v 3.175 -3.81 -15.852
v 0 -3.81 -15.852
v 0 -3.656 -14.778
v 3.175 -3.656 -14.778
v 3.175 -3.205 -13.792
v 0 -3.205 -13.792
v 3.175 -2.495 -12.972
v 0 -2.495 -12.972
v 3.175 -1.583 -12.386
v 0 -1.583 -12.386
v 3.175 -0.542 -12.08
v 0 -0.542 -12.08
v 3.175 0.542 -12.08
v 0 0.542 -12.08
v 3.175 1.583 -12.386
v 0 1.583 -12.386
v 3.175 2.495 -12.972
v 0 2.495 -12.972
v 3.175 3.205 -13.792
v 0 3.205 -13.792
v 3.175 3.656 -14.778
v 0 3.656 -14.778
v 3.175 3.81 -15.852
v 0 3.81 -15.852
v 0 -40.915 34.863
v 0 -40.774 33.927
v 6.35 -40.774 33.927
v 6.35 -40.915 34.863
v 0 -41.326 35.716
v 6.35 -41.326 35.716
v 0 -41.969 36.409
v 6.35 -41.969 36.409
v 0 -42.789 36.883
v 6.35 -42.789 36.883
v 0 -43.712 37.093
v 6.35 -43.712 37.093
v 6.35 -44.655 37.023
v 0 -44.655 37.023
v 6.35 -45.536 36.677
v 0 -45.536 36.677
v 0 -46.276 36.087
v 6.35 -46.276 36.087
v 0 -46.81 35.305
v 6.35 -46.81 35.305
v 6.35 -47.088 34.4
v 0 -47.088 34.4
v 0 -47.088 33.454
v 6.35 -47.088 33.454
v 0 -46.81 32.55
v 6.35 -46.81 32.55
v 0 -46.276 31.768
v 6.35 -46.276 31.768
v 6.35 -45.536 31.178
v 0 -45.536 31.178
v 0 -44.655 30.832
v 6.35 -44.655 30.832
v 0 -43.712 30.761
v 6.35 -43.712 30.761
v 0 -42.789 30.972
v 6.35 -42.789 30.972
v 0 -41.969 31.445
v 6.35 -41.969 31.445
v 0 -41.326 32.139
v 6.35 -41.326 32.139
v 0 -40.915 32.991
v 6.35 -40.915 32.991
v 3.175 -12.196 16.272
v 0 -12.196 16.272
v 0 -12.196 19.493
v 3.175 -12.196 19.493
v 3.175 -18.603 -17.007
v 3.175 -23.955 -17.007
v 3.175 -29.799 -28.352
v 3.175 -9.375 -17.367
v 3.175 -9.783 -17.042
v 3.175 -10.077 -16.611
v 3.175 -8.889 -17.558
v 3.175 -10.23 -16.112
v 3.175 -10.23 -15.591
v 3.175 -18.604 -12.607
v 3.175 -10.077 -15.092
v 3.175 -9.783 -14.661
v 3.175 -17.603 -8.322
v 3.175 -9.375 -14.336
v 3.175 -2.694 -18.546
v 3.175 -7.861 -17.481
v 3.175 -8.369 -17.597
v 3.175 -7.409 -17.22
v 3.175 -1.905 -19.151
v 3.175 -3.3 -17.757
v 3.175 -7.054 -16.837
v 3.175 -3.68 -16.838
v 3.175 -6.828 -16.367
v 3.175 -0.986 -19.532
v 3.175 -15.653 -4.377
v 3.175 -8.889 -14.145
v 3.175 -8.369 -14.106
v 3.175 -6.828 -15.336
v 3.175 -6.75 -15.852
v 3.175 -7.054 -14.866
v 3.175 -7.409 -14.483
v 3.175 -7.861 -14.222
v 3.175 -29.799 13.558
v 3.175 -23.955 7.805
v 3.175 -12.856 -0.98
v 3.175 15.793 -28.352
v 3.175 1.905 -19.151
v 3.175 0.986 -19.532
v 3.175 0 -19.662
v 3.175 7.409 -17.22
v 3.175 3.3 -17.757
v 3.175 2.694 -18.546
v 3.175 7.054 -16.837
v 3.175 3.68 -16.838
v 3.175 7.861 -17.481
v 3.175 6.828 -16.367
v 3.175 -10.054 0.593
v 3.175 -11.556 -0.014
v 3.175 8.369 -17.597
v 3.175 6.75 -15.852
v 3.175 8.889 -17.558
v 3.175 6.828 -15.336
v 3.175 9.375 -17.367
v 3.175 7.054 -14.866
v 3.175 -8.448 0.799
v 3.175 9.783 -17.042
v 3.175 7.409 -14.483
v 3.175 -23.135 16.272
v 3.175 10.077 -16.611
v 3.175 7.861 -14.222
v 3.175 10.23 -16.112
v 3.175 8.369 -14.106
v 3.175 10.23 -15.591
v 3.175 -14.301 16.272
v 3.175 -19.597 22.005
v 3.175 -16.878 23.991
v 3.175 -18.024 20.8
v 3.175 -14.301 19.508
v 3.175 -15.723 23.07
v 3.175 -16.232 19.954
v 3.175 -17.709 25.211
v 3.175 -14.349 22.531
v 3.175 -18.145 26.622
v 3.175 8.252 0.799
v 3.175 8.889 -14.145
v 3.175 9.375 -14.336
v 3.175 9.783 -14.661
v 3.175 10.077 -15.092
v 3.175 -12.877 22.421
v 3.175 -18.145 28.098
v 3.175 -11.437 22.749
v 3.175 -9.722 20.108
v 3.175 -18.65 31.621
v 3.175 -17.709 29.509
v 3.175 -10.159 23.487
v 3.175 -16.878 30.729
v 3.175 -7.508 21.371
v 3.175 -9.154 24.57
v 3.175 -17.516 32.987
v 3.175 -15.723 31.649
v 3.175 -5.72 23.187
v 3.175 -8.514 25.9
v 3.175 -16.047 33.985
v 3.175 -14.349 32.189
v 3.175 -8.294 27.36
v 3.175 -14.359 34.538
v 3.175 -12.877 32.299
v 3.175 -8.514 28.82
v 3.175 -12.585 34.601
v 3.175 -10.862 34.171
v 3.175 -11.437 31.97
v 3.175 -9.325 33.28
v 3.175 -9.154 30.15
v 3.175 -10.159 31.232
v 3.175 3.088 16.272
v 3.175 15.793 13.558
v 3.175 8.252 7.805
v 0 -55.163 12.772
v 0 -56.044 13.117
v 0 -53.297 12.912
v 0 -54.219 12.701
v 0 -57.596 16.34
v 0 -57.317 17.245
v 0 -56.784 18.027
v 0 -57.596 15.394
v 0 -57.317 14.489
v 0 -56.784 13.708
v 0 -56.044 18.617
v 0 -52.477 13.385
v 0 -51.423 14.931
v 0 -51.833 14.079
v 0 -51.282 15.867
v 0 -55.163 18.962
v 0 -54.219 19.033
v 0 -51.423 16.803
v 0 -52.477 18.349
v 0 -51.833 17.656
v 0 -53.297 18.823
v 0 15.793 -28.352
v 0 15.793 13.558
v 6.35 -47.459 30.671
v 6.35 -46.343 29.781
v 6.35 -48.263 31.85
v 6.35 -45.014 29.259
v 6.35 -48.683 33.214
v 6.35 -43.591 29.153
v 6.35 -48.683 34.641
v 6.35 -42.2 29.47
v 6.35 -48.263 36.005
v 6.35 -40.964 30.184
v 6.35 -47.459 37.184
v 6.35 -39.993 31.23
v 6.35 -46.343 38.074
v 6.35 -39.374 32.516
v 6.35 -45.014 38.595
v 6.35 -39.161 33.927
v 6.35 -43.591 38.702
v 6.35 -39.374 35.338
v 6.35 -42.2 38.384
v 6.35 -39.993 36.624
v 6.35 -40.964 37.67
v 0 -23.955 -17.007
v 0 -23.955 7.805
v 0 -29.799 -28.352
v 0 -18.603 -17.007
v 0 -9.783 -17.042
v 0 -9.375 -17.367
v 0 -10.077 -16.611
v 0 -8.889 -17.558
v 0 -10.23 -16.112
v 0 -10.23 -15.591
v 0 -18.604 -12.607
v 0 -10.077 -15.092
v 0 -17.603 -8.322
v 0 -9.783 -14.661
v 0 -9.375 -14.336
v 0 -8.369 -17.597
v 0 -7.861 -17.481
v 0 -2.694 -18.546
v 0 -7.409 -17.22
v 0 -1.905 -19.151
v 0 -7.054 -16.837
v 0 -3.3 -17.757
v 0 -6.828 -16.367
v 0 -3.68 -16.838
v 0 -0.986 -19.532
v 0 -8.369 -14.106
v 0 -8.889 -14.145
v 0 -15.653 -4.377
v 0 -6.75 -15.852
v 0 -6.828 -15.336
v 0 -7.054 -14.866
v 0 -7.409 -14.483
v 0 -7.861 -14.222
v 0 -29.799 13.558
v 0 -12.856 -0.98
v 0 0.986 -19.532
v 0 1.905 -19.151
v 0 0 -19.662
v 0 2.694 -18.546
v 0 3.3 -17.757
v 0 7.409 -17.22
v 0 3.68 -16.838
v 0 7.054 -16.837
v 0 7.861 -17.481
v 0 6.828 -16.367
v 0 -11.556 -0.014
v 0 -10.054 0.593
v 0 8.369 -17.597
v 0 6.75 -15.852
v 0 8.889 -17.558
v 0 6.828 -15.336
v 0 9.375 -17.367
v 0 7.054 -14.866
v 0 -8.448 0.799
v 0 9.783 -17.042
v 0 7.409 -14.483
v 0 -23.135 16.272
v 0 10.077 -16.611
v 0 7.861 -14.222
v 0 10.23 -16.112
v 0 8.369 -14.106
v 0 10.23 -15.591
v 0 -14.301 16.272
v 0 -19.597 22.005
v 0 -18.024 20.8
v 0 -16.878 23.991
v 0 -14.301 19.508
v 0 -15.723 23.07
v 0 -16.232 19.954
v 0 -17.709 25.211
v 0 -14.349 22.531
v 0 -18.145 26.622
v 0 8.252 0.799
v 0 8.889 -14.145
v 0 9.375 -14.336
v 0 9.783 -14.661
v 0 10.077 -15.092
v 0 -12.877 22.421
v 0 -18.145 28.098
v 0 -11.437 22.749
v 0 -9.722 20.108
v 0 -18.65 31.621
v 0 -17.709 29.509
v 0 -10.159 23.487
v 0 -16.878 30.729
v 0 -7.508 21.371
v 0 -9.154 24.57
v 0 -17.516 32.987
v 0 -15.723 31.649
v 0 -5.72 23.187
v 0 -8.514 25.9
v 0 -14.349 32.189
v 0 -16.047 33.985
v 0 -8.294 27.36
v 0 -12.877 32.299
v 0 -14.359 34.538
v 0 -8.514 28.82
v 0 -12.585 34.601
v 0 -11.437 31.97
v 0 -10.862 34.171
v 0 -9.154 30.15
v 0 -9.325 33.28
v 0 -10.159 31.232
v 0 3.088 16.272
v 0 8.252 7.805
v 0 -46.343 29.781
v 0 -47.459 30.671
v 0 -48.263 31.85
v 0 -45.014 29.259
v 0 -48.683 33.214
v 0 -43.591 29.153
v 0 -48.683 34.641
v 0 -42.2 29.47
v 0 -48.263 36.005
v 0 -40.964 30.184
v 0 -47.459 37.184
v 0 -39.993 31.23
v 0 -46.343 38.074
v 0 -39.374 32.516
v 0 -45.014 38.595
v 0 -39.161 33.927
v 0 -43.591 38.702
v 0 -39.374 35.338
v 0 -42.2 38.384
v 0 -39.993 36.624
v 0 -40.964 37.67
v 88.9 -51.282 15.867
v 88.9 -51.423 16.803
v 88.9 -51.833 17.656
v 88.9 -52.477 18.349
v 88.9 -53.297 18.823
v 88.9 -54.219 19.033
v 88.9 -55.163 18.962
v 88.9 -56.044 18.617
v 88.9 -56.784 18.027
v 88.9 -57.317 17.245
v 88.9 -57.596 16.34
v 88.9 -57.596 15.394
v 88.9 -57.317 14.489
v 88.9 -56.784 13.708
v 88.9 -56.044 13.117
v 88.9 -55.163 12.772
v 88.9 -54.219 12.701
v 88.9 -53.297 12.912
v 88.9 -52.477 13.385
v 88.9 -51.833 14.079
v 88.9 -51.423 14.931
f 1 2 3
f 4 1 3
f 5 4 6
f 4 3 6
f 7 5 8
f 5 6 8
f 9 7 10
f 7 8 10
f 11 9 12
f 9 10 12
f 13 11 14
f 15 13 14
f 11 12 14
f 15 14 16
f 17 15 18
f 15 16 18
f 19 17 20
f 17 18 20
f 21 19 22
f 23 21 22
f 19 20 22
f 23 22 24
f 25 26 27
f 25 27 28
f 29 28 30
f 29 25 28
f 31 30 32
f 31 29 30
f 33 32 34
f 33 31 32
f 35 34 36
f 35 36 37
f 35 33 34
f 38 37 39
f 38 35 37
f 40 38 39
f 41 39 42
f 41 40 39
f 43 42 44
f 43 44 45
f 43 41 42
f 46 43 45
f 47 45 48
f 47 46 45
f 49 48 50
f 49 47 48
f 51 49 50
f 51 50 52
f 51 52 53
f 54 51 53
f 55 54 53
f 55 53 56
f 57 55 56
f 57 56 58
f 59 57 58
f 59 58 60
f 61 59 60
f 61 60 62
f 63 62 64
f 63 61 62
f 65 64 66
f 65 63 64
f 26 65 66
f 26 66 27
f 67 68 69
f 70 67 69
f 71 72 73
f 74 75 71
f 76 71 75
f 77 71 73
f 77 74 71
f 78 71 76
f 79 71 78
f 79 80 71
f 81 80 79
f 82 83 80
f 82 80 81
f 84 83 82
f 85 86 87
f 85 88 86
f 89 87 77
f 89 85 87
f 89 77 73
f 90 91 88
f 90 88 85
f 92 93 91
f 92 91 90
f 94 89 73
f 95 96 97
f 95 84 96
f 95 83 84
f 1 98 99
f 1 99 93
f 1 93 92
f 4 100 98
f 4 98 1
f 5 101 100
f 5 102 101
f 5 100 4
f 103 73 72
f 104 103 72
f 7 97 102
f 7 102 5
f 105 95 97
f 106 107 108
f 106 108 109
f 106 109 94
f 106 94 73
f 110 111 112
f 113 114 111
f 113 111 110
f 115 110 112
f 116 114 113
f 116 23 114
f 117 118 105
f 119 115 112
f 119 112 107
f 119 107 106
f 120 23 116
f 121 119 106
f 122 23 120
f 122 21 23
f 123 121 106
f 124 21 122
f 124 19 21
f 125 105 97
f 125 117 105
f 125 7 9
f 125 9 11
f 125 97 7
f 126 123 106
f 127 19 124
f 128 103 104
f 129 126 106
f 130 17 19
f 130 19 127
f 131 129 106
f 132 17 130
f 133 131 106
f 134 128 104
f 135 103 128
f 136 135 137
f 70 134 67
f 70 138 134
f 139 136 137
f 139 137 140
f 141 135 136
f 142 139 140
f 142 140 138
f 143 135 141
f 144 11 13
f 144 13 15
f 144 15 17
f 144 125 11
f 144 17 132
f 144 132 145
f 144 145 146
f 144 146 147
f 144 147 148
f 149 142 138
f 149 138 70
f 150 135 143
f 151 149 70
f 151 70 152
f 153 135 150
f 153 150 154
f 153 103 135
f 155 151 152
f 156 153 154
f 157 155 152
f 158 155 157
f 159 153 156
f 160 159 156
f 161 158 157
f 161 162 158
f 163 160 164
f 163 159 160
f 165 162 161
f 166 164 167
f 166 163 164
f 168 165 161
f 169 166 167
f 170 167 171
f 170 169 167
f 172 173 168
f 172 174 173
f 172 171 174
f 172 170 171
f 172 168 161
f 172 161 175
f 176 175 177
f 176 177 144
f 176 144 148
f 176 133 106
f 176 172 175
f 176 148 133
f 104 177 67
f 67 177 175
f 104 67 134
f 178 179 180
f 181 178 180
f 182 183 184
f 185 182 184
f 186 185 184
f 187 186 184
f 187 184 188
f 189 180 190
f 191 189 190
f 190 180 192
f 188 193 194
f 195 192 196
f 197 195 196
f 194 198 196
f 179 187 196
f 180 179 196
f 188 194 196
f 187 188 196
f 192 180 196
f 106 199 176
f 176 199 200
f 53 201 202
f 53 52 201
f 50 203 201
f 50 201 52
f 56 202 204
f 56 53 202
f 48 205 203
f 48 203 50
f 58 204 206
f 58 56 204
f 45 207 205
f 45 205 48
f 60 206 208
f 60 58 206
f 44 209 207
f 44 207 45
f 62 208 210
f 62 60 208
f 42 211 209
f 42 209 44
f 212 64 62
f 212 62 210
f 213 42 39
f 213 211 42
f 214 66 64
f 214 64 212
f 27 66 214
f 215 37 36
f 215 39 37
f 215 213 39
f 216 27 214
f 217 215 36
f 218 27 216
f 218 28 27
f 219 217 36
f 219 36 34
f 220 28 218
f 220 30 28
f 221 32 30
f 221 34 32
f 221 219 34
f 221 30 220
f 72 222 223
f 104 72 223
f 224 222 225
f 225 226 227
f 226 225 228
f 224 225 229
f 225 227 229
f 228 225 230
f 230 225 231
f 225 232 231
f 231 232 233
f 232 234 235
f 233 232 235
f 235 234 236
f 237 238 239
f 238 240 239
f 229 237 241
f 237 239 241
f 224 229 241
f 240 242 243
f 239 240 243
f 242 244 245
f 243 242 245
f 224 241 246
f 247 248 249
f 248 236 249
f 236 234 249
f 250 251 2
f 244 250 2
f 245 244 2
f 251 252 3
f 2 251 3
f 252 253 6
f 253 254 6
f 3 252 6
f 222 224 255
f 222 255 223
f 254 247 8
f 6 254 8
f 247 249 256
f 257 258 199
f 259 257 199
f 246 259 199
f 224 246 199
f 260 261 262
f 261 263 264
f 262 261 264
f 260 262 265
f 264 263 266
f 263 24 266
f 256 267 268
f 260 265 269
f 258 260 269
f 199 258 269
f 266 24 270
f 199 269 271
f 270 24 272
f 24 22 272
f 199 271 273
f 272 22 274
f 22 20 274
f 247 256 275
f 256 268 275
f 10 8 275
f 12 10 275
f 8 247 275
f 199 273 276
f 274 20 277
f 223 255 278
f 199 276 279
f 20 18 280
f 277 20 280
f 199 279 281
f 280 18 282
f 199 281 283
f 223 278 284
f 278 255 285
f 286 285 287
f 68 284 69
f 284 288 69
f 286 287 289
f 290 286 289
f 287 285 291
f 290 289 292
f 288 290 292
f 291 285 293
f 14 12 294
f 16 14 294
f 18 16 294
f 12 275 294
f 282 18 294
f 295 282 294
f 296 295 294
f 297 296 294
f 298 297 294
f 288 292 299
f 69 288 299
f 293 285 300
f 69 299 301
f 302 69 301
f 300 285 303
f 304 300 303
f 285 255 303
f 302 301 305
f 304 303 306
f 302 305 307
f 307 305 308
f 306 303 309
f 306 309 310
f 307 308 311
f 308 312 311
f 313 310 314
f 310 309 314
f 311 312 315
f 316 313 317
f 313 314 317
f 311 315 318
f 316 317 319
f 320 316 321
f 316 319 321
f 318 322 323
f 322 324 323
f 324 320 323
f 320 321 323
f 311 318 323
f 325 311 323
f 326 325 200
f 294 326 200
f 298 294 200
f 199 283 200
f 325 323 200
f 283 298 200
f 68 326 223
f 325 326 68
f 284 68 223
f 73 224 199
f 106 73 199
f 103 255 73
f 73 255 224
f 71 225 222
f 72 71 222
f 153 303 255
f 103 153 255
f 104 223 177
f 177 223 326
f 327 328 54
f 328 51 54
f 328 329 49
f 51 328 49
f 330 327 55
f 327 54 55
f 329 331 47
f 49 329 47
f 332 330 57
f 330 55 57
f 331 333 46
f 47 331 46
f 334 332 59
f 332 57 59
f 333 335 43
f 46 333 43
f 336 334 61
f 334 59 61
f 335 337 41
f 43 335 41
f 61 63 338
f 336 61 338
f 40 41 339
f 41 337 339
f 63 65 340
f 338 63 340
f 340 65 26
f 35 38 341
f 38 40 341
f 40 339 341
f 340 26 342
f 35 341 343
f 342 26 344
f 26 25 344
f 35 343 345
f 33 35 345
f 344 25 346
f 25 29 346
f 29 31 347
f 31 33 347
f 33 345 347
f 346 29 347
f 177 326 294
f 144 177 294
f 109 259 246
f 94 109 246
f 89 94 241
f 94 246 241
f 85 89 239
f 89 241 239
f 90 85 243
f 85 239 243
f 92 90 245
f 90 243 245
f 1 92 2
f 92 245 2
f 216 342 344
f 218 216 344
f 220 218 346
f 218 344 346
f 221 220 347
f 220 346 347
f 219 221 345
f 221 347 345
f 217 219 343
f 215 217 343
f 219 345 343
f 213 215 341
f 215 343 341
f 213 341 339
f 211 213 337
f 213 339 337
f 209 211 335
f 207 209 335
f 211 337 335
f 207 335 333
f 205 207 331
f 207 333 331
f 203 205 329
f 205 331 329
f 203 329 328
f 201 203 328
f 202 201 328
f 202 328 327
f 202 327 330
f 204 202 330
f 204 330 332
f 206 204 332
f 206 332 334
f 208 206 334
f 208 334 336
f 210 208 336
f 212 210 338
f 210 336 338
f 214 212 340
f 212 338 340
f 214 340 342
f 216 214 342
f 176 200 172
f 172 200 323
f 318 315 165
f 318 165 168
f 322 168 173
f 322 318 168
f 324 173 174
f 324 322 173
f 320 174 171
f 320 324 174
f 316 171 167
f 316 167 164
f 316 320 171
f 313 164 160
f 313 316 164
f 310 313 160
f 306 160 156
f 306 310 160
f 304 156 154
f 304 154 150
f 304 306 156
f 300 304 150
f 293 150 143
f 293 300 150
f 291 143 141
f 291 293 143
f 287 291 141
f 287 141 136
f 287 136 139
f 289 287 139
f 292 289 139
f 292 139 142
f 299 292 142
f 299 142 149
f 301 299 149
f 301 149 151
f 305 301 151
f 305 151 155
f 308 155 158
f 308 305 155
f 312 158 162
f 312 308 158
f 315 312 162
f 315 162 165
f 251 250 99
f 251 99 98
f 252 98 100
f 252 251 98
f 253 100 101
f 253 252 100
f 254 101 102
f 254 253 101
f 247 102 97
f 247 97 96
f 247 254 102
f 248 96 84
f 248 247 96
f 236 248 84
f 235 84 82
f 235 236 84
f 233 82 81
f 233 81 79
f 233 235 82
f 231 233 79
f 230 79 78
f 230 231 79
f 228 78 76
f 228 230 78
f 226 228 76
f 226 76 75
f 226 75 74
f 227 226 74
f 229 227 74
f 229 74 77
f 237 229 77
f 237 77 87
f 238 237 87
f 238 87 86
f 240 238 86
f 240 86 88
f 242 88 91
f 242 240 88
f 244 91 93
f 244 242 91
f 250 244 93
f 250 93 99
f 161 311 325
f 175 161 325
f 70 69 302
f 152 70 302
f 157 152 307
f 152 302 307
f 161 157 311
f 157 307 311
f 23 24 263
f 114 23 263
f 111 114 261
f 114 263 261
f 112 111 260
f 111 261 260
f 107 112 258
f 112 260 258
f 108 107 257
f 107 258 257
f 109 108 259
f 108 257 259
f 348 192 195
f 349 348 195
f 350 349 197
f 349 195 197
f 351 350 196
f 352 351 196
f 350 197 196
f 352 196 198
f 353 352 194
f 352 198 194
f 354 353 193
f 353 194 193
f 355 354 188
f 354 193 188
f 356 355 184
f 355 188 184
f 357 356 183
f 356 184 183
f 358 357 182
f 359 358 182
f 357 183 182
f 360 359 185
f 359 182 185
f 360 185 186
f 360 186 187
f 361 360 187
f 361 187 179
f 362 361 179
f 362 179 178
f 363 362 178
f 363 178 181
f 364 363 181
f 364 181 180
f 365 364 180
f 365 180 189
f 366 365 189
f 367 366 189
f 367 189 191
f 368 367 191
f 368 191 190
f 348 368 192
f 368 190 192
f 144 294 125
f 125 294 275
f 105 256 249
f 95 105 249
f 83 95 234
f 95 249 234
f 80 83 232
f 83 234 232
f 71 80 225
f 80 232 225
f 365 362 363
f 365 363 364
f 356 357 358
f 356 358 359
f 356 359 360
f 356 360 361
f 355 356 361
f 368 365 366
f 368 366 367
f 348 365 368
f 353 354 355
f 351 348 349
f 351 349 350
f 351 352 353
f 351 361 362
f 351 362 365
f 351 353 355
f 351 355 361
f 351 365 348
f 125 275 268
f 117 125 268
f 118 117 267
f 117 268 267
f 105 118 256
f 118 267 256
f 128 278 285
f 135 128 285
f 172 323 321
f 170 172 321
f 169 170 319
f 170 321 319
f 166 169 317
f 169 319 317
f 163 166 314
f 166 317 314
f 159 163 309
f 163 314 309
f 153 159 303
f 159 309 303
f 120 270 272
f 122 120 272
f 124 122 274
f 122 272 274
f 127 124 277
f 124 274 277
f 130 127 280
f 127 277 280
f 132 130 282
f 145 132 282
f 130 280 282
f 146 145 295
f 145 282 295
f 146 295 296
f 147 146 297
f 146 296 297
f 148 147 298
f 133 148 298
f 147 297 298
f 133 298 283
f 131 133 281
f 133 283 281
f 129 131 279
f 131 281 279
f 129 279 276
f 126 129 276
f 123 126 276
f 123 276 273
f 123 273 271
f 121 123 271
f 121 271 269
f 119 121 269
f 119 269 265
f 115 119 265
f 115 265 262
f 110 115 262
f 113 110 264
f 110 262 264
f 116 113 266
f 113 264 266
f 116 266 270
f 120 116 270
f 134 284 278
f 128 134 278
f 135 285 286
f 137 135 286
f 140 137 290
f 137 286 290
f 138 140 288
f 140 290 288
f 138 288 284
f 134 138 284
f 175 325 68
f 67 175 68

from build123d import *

# Parameters (mm, degrees)
F0_R     = 1.75
F0_R_2   = 4.953
F1_DEPTH = 3.175
F2_R     = 4.7879
F2_R_2   = 3.175
F3_DEPTH = 6.35
F4_R     = 3.175
F5_DEPTH = 88.9


with BuildPart() as f1:
    # F0 (on Right) → F1 (new body)
    with BuildSketch(Plane.YZ):
        with Locations((-8.5, -15.851508)):
            Circle(F0_R)
        with BuildLine():
            ThreePointArc((10.25, -15.851508), (8.5, -14.101508), (6.75, -15.851508))
            ThreePointArc((6.75, -15.851508), (8.5, -17.601508), (10.25, -15.851508))
        make_face()
        with BuildLine():
            Line((-29.798884, 13.558492), (-29.798884, -28.351508))
            Line((-29.798884, -28.351508), (0, -28.351508))
            Line((0, -28.351508), (15.793409, -28.351508))
            Line((15.793409, -28.351508), (15.793409, 13.558492))
            Line((15.793409, 13.558492), (-9.325447, 33.280342))
            ThreePointArc((-9.325447, 33.280342), (-14.359312, 34.537623), (-18.650459, 31.621013))
            Line((-18.650459, 31.621013), (-29.798884, 13.558492))
        make_face()
        with Locations((-8.5, -15.851508)):
            Circle(F0_R, mode=Mode.SUBTRACT)
        with BuildLine():
            Line((-23.954652, -17.007083), (-23.954652, 7.805048))
            Line((-23.954652, 7.805048), (8.252467, 7.805048))
            Line((8.252467, 7.805048), (8.252467, 0.79927))
            Line((8.252467, 0.79927), (-8.448028, 0.79927))
            ThreePointArc((-8.448028, 0.79927), (-10.824796, 0.337689), (-12.85603, -0.979951))
            ThreePointArc((-12.85603, -0.979951), (-17.602587, -8.321876), (-18.603018, -17.007083))
            Line((-18.603018, -17.007083), (-23.954652, -17.007083))
        make_face(mode=Mode.SUBTRACT)
        with BuildLine():
            ThreePointArc((3.81, -15.851508), (2.694077, -18.545585), (0, -19.661508))
            ThreePointArc((0, -19.661508), (-2.694077, -18.545585), (-3.81, -15.851508))
            ThreePointArc((-3.81, -15.851508), (0, -12.041508), (3.81, -15.851508))
        make_face(mode=Mode.SUBTRACT)
        with BuildLine():
            ThreePointArc((10.25, -15.851508), (8.5, -17.601508), (6.75, -15.851508))
            ThreePointArc((6.75, -15.851508), (8.5, -14.101508), (10.25, -15.851508))
        make_face(mode=Mode.SUBTRACT)
        with BuildLine():
            Line((-23.135227, 16.272037), (-19.596748, 22.005032))
            ThreePointArc((-19.596748, 22.005032), (-17.150351, 20.329192), (-14.300954, 19.508078))
            ThreePointArc((-14.300954, 19.508078), (-13.248808, 19.440783), (-12.195803, 19.492936))
            ThreePointArc((-12.195803, 19.492936), (-8.571525, 20.662931), (-5.719503, 23.186867))
            Line((-5.719503, 23.186867), (3.087613, 16.272037))
            Line((3.087613, 16.272037), (-12.195803, 16.272037))
            Line((-12.195803, 16.272037), (-14.300954, 16.272037))
            Line((-14.300954, 16.272037), (-23.135227, 16.272037))
        make_face(mode=Mode.SUBTRACT)
        with Locations((-13.246844, 27.359838)):
            Circle(F0_R_2, mode=Mode.SUBTRACT)
        with BuildLine():
            ThreePointArc((-12.195803, 19.492936), (-13.248808, 19.440783), (-14.300954, 19.508078))
            Line((-14.300954, 19.508078), (-14.300954, 16.272037))
            Line((-14.300954, 16.272037), (-12.195803, 16.272037))
            Line((-12.195803, 16.272037), (-12.195803, 19.492936))
        make_face()
    extrude(amount=F1_DEPTH)


with BuildPart() as f3:
    # F2 (on Right) → F3 (new body)
    with BuildSketch(Plane.YZ):
        with Locations((-43.948941, 33.927131)):
            Circle(F2_R)
        with Locations((-43.948941, 33.927131)):
            Circle(F2_R_2, mode=Mode.SUBTRACT)
    extrude(amount=F3_DEPTH)


with BuildPart() as f5:
    # F4 (on Right) → F5 (new body)
    with BuildSketch(Plane.YZ):
        with Locations((-54.45661, 15.867075)):
            Circle(F4_R)
    extrude(amount=F5_DEPTH)


solid = Compound([f1.part, f3.part, f5.part])
